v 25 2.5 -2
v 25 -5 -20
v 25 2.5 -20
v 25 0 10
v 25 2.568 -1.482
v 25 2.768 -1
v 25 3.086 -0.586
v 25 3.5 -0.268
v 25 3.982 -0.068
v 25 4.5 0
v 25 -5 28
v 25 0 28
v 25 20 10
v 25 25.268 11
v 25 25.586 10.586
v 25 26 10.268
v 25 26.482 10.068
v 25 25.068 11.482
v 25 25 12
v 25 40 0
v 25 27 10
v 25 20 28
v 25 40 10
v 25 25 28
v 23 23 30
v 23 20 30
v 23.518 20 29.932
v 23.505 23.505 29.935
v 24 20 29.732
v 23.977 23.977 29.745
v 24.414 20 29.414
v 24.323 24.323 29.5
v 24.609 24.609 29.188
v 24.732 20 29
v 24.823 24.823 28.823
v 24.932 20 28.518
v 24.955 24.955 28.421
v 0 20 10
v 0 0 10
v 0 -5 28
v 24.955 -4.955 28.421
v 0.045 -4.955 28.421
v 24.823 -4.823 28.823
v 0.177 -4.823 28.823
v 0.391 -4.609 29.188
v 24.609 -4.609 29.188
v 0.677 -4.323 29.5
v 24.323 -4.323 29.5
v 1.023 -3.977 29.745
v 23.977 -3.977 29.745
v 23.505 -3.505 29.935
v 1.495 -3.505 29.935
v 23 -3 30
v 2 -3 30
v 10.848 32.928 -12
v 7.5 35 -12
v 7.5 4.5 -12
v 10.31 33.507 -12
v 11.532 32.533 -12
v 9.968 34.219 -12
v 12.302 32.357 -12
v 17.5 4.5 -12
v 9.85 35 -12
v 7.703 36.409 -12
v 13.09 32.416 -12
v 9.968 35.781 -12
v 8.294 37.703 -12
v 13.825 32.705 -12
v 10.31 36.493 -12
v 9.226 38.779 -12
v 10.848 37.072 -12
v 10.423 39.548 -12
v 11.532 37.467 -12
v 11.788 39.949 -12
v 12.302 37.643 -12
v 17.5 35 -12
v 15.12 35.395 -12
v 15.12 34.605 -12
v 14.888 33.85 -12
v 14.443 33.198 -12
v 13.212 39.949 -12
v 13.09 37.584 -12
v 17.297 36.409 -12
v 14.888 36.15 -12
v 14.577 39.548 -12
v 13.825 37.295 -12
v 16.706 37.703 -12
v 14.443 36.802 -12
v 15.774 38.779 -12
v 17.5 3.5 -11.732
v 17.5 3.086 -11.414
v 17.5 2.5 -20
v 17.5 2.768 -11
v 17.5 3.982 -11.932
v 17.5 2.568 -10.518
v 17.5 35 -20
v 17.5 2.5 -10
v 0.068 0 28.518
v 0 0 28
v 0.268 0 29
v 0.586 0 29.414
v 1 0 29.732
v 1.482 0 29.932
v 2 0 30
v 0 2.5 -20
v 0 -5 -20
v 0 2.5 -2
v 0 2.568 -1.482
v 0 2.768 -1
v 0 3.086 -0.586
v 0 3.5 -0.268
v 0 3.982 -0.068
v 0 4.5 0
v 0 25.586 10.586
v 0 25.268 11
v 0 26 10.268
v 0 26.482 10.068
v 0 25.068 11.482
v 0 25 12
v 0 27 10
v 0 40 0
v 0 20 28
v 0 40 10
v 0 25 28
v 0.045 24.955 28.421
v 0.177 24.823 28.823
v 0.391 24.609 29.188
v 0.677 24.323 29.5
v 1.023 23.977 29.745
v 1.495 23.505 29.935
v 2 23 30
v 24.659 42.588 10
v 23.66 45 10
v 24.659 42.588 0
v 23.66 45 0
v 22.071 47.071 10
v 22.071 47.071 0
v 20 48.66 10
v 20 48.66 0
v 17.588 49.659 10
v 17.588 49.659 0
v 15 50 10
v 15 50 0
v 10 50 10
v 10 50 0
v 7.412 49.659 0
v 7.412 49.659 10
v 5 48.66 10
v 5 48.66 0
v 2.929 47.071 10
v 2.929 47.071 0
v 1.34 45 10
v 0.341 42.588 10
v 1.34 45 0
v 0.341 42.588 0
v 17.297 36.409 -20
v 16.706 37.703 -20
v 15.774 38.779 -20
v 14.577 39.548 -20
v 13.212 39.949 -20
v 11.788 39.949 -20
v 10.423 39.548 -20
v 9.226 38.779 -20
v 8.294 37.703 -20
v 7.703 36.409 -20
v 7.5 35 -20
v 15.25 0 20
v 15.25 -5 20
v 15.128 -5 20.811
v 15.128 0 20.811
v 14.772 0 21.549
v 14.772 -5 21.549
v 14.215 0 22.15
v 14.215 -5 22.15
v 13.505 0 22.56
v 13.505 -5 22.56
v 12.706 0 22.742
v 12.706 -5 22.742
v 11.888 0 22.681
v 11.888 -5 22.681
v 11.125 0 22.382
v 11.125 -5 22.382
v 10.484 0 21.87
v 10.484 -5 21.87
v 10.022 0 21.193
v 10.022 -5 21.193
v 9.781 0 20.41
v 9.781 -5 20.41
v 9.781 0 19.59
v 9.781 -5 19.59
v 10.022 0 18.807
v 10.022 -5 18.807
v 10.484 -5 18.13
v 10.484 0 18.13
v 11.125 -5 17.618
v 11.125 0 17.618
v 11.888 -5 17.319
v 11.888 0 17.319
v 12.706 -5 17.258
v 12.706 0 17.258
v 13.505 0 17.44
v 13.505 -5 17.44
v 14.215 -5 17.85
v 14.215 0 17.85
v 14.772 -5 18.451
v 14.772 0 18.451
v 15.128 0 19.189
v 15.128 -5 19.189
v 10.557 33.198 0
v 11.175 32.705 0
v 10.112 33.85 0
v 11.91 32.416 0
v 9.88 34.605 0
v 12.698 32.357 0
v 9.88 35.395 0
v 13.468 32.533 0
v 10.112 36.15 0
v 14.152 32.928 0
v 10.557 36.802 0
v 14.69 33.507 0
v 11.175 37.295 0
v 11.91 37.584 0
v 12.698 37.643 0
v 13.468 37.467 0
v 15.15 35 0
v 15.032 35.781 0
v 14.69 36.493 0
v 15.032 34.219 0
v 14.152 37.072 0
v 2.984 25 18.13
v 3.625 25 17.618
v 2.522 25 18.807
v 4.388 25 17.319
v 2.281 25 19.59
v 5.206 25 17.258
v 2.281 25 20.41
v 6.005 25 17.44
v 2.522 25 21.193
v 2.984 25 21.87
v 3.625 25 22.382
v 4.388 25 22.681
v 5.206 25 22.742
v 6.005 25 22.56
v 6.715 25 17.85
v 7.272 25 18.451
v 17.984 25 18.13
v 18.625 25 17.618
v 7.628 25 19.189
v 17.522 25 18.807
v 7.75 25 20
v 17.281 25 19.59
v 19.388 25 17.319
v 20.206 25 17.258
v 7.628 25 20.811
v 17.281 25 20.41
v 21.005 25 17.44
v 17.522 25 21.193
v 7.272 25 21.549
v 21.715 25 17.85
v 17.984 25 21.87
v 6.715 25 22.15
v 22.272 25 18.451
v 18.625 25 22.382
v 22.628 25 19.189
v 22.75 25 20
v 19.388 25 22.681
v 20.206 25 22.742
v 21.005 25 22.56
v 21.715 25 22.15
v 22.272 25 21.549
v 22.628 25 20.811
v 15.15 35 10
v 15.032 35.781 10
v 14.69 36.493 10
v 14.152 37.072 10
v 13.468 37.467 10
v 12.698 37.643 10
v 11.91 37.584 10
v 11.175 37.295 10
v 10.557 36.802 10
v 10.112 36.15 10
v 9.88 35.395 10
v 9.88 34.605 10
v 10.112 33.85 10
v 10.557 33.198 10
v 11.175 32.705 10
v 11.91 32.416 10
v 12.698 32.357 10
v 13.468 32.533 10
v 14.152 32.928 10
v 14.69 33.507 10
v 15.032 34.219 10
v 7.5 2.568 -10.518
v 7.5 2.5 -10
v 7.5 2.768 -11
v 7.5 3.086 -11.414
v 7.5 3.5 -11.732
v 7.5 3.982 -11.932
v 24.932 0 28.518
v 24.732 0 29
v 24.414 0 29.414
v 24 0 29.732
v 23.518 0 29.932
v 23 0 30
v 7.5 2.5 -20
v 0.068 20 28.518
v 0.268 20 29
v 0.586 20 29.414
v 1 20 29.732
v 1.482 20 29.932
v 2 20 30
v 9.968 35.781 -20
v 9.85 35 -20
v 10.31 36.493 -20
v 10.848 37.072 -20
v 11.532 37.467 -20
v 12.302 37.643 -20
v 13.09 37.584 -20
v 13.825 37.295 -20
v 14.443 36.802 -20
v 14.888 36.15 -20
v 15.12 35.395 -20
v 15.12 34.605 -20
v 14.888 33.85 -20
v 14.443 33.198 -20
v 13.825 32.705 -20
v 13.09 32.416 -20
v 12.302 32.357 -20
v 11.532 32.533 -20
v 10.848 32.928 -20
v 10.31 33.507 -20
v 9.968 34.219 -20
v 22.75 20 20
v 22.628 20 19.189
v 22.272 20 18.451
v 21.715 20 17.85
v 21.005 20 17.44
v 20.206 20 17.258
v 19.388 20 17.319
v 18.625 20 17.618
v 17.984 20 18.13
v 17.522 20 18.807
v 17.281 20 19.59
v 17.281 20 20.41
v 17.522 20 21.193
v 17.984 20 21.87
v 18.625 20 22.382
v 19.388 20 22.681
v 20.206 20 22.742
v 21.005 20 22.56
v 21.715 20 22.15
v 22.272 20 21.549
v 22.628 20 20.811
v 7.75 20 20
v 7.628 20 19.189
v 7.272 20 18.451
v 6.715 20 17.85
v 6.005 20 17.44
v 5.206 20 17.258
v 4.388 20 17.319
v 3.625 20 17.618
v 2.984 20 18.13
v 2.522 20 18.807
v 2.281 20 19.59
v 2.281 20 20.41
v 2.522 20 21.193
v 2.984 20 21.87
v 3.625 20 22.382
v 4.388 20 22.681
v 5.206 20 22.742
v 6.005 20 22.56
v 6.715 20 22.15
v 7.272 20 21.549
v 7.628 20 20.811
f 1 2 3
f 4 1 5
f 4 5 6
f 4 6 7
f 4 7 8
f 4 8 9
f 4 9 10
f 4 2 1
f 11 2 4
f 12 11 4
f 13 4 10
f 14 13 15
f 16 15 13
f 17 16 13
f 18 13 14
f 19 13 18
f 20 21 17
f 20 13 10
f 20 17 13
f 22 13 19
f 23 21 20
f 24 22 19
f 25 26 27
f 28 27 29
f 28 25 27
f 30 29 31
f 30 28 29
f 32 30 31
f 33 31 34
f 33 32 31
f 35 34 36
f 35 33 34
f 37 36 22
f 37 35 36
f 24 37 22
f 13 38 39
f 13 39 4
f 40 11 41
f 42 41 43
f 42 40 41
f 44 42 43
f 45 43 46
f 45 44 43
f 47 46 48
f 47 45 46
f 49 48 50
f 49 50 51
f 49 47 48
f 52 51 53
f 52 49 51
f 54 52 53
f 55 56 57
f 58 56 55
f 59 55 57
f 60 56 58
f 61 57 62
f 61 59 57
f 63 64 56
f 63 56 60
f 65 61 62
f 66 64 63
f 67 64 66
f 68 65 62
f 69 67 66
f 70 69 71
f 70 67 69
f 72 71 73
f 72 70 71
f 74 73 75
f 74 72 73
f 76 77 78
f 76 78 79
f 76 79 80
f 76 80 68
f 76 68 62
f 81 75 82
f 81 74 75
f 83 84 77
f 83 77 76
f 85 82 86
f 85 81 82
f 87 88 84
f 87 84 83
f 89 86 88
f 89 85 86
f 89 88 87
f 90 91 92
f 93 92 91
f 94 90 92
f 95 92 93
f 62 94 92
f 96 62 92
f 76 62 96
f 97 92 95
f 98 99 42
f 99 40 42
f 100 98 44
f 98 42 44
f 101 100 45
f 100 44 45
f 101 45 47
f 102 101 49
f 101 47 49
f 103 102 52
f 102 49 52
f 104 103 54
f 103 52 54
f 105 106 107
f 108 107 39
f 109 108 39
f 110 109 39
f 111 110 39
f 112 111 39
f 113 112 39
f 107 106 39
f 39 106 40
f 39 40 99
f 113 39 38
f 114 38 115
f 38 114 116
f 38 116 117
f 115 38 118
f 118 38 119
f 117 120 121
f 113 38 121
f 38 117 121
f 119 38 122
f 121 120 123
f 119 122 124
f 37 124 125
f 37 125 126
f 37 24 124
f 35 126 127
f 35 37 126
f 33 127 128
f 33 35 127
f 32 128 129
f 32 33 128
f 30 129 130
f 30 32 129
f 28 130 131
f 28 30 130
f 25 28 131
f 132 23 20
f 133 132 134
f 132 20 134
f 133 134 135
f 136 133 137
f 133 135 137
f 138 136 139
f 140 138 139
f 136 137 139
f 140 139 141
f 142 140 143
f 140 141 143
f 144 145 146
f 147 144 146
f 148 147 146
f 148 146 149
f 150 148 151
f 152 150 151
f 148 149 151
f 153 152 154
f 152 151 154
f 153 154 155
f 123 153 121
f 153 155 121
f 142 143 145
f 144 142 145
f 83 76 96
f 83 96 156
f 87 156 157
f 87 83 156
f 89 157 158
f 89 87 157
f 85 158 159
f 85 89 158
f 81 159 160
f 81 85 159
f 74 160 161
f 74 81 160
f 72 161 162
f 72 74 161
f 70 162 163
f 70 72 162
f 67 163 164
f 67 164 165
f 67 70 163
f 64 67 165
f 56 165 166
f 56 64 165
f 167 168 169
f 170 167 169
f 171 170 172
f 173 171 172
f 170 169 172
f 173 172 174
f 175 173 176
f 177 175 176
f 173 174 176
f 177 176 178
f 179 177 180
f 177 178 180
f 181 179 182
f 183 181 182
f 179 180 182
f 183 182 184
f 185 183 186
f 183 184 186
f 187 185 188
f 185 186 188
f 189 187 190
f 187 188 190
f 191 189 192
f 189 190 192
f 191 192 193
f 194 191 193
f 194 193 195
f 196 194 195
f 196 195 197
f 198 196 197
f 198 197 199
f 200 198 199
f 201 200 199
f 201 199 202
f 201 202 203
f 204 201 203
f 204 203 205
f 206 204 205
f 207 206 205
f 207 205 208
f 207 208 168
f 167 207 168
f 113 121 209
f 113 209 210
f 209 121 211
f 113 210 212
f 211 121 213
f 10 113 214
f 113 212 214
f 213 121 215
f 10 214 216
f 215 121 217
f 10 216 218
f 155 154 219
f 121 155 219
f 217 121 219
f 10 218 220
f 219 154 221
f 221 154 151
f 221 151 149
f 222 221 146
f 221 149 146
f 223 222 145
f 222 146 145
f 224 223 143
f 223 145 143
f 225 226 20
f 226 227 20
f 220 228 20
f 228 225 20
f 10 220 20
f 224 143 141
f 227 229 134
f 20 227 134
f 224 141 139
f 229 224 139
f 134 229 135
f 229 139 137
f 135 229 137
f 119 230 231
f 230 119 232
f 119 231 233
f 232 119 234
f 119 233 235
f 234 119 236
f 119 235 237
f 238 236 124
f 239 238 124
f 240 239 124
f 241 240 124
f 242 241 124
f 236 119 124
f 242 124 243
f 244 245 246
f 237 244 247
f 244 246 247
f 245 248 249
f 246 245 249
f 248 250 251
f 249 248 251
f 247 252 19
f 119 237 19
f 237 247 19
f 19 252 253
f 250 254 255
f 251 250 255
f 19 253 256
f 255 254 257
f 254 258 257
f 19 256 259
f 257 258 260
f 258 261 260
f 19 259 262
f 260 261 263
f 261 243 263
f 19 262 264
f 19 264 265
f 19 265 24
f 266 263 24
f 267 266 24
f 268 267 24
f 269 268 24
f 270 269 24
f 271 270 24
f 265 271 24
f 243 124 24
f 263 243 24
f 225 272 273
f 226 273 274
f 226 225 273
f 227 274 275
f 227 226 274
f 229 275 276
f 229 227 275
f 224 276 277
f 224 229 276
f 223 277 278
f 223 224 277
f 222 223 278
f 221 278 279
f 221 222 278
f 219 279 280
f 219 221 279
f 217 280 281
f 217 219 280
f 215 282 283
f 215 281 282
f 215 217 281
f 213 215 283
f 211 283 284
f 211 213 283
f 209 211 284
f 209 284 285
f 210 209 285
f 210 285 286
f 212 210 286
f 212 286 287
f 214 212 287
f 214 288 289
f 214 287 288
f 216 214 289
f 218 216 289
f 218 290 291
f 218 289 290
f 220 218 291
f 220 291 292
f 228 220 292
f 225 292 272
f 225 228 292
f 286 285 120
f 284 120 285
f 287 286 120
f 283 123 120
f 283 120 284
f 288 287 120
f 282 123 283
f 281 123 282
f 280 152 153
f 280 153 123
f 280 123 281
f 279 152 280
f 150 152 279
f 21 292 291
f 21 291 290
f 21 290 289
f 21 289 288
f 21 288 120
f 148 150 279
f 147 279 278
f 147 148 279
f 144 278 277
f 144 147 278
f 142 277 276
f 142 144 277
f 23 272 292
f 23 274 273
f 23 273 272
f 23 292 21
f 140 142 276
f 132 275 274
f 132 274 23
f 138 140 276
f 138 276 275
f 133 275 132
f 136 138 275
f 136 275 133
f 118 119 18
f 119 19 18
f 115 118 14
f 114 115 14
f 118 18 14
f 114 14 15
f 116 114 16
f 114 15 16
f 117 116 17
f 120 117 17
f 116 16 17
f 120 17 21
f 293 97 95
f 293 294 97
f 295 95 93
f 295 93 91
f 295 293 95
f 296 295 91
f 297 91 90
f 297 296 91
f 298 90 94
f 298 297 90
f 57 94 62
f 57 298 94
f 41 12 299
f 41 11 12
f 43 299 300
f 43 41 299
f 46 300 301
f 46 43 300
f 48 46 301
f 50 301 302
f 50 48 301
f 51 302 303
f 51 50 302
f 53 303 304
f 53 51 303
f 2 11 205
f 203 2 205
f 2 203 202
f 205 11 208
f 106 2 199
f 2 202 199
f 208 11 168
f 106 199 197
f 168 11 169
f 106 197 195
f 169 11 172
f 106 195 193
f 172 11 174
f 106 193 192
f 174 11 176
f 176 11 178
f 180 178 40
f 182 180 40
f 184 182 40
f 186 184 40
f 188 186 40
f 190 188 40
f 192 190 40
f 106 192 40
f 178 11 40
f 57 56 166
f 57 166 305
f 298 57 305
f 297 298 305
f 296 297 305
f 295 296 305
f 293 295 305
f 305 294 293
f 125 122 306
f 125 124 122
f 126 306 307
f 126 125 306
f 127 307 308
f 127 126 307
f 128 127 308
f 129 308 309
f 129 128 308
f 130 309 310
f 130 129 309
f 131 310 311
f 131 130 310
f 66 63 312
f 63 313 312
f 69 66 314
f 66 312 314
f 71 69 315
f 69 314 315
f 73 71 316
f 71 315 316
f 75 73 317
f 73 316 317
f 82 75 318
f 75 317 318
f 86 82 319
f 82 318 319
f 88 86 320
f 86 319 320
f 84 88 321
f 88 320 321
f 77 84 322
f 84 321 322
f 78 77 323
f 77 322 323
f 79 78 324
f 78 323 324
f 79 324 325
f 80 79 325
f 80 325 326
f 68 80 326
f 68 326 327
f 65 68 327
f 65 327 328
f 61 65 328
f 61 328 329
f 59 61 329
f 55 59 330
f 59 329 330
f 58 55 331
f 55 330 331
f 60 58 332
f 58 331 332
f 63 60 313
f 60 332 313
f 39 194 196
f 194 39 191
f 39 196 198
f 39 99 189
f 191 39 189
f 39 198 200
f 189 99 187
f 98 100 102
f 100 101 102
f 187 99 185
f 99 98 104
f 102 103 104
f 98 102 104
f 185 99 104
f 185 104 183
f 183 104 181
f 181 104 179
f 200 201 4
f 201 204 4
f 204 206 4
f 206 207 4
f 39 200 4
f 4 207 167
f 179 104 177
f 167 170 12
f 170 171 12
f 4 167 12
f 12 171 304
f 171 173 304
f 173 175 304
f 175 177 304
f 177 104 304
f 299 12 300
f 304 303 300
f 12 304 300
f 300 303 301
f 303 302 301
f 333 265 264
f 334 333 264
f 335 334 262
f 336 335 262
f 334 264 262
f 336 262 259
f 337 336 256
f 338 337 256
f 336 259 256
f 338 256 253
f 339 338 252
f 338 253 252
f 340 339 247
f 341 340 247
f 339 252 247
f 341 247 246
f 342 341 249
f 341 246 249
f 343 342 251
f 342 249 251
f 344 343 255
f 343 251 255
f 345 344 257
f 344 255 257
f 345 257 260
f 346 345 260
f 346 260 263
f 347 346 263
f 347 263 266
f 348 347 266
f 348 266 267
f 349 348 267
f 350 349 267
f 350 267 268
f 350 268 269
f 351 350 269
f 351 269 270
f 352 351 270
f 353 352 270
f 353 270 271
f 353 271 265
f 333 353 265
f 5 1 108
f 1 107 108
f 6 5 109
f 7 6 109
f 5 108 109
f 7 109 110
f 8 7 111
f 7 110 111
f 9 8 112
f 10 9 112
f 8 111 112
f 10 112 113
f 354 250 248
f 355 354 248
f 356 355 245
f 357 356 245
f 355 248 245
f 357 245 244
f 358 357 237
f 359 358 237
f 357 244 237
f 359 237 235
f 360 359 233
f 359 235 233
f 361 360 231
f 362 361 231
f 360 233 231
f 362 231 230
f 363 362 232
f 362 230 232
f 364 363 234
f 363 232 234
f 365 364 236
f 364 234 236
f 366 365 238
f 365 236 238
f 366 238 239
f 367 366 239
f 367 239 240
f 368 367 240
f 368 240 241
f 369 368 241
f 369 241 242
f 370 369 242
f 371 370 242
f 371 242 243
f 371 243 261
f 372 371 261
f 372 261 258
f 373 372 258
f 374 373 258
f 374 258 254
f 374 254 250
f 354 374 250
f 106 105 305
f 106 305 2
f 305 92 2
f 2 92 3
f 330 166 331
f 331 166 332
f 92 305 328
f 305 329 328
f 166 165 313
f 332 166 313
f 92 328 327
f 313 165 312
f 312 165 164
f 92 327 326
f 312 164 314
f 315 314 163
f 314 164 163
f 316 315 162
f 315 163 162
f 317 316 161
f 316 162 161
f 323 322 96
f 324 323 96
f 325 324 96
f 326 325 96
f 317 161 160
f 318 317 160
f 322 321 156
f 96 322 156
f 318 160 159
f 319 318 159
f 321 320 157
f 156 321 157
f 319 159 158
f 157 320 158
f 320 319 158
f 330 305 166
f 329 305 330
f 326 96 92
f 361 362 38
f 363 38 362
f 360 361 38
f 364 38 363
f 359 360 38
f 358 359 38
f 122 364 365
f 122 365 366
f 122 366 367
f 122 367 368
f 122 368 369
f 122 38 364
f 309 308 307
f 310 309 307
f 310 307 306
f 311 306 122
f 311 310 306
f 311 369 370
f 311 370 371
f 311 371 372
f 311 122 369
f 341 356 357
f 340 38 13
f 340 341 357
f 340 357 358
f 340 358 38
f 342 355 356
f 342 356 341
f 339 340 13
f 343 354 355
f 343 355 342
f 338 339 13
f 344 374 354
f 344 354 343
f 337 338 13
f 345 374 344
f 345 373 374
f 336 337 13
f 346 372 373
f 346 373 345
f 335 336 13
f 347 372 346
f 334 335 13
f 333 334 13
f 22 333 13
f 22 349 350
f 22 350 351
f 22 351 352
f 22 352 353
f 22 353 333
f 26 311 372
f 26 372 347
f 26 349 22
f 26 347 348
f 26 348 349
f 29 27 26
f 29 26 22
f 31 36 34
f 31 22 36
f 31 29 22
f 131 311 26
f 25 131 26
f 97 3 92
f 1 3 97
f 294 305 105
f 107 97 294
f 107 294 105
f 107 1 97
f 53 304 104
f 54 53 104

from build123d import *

# Parameters (mm, degrees)
SKETCH1_R           = 2.65
BOSS_EXTRUDE1_DEPTH = 10
BOSS_EXTRUDE2_START = -20
SKETCH2_W           = 25
SKETCH2_H           = 20
BOSS_EXTRUDE2_DEPTH = 5
BOSS_EXTRUDE3_DEPTH = 5
SKETCH4_W           = 25
SKETCH4_H           = 7.5
BOSS_EXTRUDE4_DEPTH = 20
SKETCH5_W           = 10
SKETCH5_H           = 20
BOSS_EXTRUDE5_DEPTH = 8
FILLET2_R           = 2
SKETCH6_R           = 2.75
CUT_EXTRUDE1_DEPTH  = 6
SKETCH7_R           = 2.75
CUT_EXTRUDE2_DEPTH  = 6
BOSS_EXTRUDE6_START = -8
BOSS_EXTRUDE6_DEPTH = 8
SKETCH9_R           = 2.65
CUT_EXTRUDE3_DEPTH  = 50
FILLET4_R           = 2
FILLET6_R           = 2


with BuildPart() as part:
    # Sketch1 → Boss-Extrude1 (new body)
    with BuildSketch(Plane.XY):
        with BuildLine():
            Line((0, 0), (25, 0))
            Line((25, 0), (25, 40))
            ThreePointArc((25, 40), (22.071067812, 47.071067812), (15, 50))
            Line((15, 50), (10, 50))
            ThreePointArc((10, 50), (2.928932188, 47.071067812), (0, 40))
            Line((0, 40), (0, 0))
        make_face()
        with Locations((12.5, 35)):
            Circle(SKETCH1_R, mode=Mode.SUBTRACT)
    extrude(amount=BOSS_EXTRUDE1_DEPTH)

    # Sketch2 → Boss-Extrude2 (add)
    with BuildSketch(Plane.XZ.offset(BOSS_EXTRUDE2_START)):
        with Locations((12.5, 20)):
            Rectangle(SKETCH2_W, SKETCH2_H)
    extrude(amount=-BOSS_EXTRUDE2_DEPTH)

    # Sketch3 → Boss-Extrude3 (add)
    with BuildSketch(Plane.XZ):
        Polygon((0, 0), (25, 0), (25, 10), (25, 30), (0, 30), (0, 10), align=None)
    extrude(amount=BOSS_EXTRUDE3_DEPTH)

    # Sketch4 → Boss-Extrude4 (add)
    with BuildSketch(Plane(origin=(0, 0, 0), x_dir=(-1, 0, 0), z_dir=(0, 0, -1))):
        with Locations((-12.5, -1.25)):
            Rectangle(SKETCH4_W, SKETCH4_H)
    extrude(amount=BOSS_EXTRUDE4_DEPTH)

    # Sketch5 → Boss-Extrude5 (add)
    with BuildSketch(Plane(origin=(0, 0, -20), x_dir=(-1, 0, 0), z_dir=(0, 0, -1))):
        with Locations((-12.5, 12.5)):
            Rectangle(SKETCH5_W, SKETCH5_H)
    extrude(amount=-BOSS_EXTRUDE5_DEPTH)

    # Fillet2
    fillet2_edges = [part.edges().sort_by_distance(p)[0] for p in [
        (12.5, 2.5, 0),
        (12.5, 2.5, -12),
    ]]
    fillet(fillet2_edges, radius=FILLET2_R)

    # Sketch6 → Cut-Extrude1 (cut)
    with BuildSketch(Plane(origin=(0, 25, 0), x_dir=(1, 0, 0), z_dir=(0, 1, 0))):
        with Locations((5, -20)):
            Circle(SKETCH6_R)
        with Locations((20, -20)):
            Circle(SKETCH6_R)
    extrude(amount=-CUT_EXTRUDE1_DEPTH, mode=Mode.SUBTRACT)

    # Sketch7 → Cut-Extrude2 (cut)
    with BuildSketch(Plane.XZ.offset(5)):
        with Locations((12.5, 20)):
            Circle(SKETCH7_R)
    extrude(amount=-CUT_EXTRUDE2_DEPTH, mode=Mode.SUBTRACT)

    # Sketch8 → Boss-Extrude6 (add)
    with BuildSketch(Plane(origin=(0, 0, -20), x_dir=(-1, 0, 0), z_dir=(0, 0, -1)).offset(BOSS_EXTRUDE6_START)):
        with BuildLine():
            Line((-17.5, 22.5), (-17.5, 35))
            ThreePointArc((-17.5, 35), (-12.5, 40), (-7.5, 35))
            Line((-7.5, 35), (-7.5, 22.5))
            Line((-7.5, 22.5), (-17.5, 22.5))
        make_face()
    extrude(amount=BOSS_EXTRUDE6_DEPTH)

    # Sketch9 → Cut-Extrude3 (cut)
    with BuildSketch(Plane(origin=(0, 0, -20), x_dir=(-1, 0, 0), z_dir=(0, 0, -1))):
        with Locations((-12.5, 35)):
            Circle(SKETCH9_R)
    extrude(amount=-CUT_EXTRUDE3_DEPTH, mode=Mode.SUBTRACT)

    # Fillet4
    fillet4_edges = [part.edges().sort_by_distance(p)[0] for p in [
        (12.5, 25, 10),
    ]]
    fillet(fillet4_edges, radius=FILLET4_R)

    # Fillet6
    fillet6_edges = [part.edges().sort_by_distance(p)[0] for p in [
        (12.5, 25, 30),
        (0, 22.5, 30),
        (25, 22.5, 30),
        (25, -2.5, 30),
        (0, -2.5, 30),
        (12.5, -5, 30),
    ]]
    fillet(fillet6_edges, radius=FILLET6_R)


solid = part.part
